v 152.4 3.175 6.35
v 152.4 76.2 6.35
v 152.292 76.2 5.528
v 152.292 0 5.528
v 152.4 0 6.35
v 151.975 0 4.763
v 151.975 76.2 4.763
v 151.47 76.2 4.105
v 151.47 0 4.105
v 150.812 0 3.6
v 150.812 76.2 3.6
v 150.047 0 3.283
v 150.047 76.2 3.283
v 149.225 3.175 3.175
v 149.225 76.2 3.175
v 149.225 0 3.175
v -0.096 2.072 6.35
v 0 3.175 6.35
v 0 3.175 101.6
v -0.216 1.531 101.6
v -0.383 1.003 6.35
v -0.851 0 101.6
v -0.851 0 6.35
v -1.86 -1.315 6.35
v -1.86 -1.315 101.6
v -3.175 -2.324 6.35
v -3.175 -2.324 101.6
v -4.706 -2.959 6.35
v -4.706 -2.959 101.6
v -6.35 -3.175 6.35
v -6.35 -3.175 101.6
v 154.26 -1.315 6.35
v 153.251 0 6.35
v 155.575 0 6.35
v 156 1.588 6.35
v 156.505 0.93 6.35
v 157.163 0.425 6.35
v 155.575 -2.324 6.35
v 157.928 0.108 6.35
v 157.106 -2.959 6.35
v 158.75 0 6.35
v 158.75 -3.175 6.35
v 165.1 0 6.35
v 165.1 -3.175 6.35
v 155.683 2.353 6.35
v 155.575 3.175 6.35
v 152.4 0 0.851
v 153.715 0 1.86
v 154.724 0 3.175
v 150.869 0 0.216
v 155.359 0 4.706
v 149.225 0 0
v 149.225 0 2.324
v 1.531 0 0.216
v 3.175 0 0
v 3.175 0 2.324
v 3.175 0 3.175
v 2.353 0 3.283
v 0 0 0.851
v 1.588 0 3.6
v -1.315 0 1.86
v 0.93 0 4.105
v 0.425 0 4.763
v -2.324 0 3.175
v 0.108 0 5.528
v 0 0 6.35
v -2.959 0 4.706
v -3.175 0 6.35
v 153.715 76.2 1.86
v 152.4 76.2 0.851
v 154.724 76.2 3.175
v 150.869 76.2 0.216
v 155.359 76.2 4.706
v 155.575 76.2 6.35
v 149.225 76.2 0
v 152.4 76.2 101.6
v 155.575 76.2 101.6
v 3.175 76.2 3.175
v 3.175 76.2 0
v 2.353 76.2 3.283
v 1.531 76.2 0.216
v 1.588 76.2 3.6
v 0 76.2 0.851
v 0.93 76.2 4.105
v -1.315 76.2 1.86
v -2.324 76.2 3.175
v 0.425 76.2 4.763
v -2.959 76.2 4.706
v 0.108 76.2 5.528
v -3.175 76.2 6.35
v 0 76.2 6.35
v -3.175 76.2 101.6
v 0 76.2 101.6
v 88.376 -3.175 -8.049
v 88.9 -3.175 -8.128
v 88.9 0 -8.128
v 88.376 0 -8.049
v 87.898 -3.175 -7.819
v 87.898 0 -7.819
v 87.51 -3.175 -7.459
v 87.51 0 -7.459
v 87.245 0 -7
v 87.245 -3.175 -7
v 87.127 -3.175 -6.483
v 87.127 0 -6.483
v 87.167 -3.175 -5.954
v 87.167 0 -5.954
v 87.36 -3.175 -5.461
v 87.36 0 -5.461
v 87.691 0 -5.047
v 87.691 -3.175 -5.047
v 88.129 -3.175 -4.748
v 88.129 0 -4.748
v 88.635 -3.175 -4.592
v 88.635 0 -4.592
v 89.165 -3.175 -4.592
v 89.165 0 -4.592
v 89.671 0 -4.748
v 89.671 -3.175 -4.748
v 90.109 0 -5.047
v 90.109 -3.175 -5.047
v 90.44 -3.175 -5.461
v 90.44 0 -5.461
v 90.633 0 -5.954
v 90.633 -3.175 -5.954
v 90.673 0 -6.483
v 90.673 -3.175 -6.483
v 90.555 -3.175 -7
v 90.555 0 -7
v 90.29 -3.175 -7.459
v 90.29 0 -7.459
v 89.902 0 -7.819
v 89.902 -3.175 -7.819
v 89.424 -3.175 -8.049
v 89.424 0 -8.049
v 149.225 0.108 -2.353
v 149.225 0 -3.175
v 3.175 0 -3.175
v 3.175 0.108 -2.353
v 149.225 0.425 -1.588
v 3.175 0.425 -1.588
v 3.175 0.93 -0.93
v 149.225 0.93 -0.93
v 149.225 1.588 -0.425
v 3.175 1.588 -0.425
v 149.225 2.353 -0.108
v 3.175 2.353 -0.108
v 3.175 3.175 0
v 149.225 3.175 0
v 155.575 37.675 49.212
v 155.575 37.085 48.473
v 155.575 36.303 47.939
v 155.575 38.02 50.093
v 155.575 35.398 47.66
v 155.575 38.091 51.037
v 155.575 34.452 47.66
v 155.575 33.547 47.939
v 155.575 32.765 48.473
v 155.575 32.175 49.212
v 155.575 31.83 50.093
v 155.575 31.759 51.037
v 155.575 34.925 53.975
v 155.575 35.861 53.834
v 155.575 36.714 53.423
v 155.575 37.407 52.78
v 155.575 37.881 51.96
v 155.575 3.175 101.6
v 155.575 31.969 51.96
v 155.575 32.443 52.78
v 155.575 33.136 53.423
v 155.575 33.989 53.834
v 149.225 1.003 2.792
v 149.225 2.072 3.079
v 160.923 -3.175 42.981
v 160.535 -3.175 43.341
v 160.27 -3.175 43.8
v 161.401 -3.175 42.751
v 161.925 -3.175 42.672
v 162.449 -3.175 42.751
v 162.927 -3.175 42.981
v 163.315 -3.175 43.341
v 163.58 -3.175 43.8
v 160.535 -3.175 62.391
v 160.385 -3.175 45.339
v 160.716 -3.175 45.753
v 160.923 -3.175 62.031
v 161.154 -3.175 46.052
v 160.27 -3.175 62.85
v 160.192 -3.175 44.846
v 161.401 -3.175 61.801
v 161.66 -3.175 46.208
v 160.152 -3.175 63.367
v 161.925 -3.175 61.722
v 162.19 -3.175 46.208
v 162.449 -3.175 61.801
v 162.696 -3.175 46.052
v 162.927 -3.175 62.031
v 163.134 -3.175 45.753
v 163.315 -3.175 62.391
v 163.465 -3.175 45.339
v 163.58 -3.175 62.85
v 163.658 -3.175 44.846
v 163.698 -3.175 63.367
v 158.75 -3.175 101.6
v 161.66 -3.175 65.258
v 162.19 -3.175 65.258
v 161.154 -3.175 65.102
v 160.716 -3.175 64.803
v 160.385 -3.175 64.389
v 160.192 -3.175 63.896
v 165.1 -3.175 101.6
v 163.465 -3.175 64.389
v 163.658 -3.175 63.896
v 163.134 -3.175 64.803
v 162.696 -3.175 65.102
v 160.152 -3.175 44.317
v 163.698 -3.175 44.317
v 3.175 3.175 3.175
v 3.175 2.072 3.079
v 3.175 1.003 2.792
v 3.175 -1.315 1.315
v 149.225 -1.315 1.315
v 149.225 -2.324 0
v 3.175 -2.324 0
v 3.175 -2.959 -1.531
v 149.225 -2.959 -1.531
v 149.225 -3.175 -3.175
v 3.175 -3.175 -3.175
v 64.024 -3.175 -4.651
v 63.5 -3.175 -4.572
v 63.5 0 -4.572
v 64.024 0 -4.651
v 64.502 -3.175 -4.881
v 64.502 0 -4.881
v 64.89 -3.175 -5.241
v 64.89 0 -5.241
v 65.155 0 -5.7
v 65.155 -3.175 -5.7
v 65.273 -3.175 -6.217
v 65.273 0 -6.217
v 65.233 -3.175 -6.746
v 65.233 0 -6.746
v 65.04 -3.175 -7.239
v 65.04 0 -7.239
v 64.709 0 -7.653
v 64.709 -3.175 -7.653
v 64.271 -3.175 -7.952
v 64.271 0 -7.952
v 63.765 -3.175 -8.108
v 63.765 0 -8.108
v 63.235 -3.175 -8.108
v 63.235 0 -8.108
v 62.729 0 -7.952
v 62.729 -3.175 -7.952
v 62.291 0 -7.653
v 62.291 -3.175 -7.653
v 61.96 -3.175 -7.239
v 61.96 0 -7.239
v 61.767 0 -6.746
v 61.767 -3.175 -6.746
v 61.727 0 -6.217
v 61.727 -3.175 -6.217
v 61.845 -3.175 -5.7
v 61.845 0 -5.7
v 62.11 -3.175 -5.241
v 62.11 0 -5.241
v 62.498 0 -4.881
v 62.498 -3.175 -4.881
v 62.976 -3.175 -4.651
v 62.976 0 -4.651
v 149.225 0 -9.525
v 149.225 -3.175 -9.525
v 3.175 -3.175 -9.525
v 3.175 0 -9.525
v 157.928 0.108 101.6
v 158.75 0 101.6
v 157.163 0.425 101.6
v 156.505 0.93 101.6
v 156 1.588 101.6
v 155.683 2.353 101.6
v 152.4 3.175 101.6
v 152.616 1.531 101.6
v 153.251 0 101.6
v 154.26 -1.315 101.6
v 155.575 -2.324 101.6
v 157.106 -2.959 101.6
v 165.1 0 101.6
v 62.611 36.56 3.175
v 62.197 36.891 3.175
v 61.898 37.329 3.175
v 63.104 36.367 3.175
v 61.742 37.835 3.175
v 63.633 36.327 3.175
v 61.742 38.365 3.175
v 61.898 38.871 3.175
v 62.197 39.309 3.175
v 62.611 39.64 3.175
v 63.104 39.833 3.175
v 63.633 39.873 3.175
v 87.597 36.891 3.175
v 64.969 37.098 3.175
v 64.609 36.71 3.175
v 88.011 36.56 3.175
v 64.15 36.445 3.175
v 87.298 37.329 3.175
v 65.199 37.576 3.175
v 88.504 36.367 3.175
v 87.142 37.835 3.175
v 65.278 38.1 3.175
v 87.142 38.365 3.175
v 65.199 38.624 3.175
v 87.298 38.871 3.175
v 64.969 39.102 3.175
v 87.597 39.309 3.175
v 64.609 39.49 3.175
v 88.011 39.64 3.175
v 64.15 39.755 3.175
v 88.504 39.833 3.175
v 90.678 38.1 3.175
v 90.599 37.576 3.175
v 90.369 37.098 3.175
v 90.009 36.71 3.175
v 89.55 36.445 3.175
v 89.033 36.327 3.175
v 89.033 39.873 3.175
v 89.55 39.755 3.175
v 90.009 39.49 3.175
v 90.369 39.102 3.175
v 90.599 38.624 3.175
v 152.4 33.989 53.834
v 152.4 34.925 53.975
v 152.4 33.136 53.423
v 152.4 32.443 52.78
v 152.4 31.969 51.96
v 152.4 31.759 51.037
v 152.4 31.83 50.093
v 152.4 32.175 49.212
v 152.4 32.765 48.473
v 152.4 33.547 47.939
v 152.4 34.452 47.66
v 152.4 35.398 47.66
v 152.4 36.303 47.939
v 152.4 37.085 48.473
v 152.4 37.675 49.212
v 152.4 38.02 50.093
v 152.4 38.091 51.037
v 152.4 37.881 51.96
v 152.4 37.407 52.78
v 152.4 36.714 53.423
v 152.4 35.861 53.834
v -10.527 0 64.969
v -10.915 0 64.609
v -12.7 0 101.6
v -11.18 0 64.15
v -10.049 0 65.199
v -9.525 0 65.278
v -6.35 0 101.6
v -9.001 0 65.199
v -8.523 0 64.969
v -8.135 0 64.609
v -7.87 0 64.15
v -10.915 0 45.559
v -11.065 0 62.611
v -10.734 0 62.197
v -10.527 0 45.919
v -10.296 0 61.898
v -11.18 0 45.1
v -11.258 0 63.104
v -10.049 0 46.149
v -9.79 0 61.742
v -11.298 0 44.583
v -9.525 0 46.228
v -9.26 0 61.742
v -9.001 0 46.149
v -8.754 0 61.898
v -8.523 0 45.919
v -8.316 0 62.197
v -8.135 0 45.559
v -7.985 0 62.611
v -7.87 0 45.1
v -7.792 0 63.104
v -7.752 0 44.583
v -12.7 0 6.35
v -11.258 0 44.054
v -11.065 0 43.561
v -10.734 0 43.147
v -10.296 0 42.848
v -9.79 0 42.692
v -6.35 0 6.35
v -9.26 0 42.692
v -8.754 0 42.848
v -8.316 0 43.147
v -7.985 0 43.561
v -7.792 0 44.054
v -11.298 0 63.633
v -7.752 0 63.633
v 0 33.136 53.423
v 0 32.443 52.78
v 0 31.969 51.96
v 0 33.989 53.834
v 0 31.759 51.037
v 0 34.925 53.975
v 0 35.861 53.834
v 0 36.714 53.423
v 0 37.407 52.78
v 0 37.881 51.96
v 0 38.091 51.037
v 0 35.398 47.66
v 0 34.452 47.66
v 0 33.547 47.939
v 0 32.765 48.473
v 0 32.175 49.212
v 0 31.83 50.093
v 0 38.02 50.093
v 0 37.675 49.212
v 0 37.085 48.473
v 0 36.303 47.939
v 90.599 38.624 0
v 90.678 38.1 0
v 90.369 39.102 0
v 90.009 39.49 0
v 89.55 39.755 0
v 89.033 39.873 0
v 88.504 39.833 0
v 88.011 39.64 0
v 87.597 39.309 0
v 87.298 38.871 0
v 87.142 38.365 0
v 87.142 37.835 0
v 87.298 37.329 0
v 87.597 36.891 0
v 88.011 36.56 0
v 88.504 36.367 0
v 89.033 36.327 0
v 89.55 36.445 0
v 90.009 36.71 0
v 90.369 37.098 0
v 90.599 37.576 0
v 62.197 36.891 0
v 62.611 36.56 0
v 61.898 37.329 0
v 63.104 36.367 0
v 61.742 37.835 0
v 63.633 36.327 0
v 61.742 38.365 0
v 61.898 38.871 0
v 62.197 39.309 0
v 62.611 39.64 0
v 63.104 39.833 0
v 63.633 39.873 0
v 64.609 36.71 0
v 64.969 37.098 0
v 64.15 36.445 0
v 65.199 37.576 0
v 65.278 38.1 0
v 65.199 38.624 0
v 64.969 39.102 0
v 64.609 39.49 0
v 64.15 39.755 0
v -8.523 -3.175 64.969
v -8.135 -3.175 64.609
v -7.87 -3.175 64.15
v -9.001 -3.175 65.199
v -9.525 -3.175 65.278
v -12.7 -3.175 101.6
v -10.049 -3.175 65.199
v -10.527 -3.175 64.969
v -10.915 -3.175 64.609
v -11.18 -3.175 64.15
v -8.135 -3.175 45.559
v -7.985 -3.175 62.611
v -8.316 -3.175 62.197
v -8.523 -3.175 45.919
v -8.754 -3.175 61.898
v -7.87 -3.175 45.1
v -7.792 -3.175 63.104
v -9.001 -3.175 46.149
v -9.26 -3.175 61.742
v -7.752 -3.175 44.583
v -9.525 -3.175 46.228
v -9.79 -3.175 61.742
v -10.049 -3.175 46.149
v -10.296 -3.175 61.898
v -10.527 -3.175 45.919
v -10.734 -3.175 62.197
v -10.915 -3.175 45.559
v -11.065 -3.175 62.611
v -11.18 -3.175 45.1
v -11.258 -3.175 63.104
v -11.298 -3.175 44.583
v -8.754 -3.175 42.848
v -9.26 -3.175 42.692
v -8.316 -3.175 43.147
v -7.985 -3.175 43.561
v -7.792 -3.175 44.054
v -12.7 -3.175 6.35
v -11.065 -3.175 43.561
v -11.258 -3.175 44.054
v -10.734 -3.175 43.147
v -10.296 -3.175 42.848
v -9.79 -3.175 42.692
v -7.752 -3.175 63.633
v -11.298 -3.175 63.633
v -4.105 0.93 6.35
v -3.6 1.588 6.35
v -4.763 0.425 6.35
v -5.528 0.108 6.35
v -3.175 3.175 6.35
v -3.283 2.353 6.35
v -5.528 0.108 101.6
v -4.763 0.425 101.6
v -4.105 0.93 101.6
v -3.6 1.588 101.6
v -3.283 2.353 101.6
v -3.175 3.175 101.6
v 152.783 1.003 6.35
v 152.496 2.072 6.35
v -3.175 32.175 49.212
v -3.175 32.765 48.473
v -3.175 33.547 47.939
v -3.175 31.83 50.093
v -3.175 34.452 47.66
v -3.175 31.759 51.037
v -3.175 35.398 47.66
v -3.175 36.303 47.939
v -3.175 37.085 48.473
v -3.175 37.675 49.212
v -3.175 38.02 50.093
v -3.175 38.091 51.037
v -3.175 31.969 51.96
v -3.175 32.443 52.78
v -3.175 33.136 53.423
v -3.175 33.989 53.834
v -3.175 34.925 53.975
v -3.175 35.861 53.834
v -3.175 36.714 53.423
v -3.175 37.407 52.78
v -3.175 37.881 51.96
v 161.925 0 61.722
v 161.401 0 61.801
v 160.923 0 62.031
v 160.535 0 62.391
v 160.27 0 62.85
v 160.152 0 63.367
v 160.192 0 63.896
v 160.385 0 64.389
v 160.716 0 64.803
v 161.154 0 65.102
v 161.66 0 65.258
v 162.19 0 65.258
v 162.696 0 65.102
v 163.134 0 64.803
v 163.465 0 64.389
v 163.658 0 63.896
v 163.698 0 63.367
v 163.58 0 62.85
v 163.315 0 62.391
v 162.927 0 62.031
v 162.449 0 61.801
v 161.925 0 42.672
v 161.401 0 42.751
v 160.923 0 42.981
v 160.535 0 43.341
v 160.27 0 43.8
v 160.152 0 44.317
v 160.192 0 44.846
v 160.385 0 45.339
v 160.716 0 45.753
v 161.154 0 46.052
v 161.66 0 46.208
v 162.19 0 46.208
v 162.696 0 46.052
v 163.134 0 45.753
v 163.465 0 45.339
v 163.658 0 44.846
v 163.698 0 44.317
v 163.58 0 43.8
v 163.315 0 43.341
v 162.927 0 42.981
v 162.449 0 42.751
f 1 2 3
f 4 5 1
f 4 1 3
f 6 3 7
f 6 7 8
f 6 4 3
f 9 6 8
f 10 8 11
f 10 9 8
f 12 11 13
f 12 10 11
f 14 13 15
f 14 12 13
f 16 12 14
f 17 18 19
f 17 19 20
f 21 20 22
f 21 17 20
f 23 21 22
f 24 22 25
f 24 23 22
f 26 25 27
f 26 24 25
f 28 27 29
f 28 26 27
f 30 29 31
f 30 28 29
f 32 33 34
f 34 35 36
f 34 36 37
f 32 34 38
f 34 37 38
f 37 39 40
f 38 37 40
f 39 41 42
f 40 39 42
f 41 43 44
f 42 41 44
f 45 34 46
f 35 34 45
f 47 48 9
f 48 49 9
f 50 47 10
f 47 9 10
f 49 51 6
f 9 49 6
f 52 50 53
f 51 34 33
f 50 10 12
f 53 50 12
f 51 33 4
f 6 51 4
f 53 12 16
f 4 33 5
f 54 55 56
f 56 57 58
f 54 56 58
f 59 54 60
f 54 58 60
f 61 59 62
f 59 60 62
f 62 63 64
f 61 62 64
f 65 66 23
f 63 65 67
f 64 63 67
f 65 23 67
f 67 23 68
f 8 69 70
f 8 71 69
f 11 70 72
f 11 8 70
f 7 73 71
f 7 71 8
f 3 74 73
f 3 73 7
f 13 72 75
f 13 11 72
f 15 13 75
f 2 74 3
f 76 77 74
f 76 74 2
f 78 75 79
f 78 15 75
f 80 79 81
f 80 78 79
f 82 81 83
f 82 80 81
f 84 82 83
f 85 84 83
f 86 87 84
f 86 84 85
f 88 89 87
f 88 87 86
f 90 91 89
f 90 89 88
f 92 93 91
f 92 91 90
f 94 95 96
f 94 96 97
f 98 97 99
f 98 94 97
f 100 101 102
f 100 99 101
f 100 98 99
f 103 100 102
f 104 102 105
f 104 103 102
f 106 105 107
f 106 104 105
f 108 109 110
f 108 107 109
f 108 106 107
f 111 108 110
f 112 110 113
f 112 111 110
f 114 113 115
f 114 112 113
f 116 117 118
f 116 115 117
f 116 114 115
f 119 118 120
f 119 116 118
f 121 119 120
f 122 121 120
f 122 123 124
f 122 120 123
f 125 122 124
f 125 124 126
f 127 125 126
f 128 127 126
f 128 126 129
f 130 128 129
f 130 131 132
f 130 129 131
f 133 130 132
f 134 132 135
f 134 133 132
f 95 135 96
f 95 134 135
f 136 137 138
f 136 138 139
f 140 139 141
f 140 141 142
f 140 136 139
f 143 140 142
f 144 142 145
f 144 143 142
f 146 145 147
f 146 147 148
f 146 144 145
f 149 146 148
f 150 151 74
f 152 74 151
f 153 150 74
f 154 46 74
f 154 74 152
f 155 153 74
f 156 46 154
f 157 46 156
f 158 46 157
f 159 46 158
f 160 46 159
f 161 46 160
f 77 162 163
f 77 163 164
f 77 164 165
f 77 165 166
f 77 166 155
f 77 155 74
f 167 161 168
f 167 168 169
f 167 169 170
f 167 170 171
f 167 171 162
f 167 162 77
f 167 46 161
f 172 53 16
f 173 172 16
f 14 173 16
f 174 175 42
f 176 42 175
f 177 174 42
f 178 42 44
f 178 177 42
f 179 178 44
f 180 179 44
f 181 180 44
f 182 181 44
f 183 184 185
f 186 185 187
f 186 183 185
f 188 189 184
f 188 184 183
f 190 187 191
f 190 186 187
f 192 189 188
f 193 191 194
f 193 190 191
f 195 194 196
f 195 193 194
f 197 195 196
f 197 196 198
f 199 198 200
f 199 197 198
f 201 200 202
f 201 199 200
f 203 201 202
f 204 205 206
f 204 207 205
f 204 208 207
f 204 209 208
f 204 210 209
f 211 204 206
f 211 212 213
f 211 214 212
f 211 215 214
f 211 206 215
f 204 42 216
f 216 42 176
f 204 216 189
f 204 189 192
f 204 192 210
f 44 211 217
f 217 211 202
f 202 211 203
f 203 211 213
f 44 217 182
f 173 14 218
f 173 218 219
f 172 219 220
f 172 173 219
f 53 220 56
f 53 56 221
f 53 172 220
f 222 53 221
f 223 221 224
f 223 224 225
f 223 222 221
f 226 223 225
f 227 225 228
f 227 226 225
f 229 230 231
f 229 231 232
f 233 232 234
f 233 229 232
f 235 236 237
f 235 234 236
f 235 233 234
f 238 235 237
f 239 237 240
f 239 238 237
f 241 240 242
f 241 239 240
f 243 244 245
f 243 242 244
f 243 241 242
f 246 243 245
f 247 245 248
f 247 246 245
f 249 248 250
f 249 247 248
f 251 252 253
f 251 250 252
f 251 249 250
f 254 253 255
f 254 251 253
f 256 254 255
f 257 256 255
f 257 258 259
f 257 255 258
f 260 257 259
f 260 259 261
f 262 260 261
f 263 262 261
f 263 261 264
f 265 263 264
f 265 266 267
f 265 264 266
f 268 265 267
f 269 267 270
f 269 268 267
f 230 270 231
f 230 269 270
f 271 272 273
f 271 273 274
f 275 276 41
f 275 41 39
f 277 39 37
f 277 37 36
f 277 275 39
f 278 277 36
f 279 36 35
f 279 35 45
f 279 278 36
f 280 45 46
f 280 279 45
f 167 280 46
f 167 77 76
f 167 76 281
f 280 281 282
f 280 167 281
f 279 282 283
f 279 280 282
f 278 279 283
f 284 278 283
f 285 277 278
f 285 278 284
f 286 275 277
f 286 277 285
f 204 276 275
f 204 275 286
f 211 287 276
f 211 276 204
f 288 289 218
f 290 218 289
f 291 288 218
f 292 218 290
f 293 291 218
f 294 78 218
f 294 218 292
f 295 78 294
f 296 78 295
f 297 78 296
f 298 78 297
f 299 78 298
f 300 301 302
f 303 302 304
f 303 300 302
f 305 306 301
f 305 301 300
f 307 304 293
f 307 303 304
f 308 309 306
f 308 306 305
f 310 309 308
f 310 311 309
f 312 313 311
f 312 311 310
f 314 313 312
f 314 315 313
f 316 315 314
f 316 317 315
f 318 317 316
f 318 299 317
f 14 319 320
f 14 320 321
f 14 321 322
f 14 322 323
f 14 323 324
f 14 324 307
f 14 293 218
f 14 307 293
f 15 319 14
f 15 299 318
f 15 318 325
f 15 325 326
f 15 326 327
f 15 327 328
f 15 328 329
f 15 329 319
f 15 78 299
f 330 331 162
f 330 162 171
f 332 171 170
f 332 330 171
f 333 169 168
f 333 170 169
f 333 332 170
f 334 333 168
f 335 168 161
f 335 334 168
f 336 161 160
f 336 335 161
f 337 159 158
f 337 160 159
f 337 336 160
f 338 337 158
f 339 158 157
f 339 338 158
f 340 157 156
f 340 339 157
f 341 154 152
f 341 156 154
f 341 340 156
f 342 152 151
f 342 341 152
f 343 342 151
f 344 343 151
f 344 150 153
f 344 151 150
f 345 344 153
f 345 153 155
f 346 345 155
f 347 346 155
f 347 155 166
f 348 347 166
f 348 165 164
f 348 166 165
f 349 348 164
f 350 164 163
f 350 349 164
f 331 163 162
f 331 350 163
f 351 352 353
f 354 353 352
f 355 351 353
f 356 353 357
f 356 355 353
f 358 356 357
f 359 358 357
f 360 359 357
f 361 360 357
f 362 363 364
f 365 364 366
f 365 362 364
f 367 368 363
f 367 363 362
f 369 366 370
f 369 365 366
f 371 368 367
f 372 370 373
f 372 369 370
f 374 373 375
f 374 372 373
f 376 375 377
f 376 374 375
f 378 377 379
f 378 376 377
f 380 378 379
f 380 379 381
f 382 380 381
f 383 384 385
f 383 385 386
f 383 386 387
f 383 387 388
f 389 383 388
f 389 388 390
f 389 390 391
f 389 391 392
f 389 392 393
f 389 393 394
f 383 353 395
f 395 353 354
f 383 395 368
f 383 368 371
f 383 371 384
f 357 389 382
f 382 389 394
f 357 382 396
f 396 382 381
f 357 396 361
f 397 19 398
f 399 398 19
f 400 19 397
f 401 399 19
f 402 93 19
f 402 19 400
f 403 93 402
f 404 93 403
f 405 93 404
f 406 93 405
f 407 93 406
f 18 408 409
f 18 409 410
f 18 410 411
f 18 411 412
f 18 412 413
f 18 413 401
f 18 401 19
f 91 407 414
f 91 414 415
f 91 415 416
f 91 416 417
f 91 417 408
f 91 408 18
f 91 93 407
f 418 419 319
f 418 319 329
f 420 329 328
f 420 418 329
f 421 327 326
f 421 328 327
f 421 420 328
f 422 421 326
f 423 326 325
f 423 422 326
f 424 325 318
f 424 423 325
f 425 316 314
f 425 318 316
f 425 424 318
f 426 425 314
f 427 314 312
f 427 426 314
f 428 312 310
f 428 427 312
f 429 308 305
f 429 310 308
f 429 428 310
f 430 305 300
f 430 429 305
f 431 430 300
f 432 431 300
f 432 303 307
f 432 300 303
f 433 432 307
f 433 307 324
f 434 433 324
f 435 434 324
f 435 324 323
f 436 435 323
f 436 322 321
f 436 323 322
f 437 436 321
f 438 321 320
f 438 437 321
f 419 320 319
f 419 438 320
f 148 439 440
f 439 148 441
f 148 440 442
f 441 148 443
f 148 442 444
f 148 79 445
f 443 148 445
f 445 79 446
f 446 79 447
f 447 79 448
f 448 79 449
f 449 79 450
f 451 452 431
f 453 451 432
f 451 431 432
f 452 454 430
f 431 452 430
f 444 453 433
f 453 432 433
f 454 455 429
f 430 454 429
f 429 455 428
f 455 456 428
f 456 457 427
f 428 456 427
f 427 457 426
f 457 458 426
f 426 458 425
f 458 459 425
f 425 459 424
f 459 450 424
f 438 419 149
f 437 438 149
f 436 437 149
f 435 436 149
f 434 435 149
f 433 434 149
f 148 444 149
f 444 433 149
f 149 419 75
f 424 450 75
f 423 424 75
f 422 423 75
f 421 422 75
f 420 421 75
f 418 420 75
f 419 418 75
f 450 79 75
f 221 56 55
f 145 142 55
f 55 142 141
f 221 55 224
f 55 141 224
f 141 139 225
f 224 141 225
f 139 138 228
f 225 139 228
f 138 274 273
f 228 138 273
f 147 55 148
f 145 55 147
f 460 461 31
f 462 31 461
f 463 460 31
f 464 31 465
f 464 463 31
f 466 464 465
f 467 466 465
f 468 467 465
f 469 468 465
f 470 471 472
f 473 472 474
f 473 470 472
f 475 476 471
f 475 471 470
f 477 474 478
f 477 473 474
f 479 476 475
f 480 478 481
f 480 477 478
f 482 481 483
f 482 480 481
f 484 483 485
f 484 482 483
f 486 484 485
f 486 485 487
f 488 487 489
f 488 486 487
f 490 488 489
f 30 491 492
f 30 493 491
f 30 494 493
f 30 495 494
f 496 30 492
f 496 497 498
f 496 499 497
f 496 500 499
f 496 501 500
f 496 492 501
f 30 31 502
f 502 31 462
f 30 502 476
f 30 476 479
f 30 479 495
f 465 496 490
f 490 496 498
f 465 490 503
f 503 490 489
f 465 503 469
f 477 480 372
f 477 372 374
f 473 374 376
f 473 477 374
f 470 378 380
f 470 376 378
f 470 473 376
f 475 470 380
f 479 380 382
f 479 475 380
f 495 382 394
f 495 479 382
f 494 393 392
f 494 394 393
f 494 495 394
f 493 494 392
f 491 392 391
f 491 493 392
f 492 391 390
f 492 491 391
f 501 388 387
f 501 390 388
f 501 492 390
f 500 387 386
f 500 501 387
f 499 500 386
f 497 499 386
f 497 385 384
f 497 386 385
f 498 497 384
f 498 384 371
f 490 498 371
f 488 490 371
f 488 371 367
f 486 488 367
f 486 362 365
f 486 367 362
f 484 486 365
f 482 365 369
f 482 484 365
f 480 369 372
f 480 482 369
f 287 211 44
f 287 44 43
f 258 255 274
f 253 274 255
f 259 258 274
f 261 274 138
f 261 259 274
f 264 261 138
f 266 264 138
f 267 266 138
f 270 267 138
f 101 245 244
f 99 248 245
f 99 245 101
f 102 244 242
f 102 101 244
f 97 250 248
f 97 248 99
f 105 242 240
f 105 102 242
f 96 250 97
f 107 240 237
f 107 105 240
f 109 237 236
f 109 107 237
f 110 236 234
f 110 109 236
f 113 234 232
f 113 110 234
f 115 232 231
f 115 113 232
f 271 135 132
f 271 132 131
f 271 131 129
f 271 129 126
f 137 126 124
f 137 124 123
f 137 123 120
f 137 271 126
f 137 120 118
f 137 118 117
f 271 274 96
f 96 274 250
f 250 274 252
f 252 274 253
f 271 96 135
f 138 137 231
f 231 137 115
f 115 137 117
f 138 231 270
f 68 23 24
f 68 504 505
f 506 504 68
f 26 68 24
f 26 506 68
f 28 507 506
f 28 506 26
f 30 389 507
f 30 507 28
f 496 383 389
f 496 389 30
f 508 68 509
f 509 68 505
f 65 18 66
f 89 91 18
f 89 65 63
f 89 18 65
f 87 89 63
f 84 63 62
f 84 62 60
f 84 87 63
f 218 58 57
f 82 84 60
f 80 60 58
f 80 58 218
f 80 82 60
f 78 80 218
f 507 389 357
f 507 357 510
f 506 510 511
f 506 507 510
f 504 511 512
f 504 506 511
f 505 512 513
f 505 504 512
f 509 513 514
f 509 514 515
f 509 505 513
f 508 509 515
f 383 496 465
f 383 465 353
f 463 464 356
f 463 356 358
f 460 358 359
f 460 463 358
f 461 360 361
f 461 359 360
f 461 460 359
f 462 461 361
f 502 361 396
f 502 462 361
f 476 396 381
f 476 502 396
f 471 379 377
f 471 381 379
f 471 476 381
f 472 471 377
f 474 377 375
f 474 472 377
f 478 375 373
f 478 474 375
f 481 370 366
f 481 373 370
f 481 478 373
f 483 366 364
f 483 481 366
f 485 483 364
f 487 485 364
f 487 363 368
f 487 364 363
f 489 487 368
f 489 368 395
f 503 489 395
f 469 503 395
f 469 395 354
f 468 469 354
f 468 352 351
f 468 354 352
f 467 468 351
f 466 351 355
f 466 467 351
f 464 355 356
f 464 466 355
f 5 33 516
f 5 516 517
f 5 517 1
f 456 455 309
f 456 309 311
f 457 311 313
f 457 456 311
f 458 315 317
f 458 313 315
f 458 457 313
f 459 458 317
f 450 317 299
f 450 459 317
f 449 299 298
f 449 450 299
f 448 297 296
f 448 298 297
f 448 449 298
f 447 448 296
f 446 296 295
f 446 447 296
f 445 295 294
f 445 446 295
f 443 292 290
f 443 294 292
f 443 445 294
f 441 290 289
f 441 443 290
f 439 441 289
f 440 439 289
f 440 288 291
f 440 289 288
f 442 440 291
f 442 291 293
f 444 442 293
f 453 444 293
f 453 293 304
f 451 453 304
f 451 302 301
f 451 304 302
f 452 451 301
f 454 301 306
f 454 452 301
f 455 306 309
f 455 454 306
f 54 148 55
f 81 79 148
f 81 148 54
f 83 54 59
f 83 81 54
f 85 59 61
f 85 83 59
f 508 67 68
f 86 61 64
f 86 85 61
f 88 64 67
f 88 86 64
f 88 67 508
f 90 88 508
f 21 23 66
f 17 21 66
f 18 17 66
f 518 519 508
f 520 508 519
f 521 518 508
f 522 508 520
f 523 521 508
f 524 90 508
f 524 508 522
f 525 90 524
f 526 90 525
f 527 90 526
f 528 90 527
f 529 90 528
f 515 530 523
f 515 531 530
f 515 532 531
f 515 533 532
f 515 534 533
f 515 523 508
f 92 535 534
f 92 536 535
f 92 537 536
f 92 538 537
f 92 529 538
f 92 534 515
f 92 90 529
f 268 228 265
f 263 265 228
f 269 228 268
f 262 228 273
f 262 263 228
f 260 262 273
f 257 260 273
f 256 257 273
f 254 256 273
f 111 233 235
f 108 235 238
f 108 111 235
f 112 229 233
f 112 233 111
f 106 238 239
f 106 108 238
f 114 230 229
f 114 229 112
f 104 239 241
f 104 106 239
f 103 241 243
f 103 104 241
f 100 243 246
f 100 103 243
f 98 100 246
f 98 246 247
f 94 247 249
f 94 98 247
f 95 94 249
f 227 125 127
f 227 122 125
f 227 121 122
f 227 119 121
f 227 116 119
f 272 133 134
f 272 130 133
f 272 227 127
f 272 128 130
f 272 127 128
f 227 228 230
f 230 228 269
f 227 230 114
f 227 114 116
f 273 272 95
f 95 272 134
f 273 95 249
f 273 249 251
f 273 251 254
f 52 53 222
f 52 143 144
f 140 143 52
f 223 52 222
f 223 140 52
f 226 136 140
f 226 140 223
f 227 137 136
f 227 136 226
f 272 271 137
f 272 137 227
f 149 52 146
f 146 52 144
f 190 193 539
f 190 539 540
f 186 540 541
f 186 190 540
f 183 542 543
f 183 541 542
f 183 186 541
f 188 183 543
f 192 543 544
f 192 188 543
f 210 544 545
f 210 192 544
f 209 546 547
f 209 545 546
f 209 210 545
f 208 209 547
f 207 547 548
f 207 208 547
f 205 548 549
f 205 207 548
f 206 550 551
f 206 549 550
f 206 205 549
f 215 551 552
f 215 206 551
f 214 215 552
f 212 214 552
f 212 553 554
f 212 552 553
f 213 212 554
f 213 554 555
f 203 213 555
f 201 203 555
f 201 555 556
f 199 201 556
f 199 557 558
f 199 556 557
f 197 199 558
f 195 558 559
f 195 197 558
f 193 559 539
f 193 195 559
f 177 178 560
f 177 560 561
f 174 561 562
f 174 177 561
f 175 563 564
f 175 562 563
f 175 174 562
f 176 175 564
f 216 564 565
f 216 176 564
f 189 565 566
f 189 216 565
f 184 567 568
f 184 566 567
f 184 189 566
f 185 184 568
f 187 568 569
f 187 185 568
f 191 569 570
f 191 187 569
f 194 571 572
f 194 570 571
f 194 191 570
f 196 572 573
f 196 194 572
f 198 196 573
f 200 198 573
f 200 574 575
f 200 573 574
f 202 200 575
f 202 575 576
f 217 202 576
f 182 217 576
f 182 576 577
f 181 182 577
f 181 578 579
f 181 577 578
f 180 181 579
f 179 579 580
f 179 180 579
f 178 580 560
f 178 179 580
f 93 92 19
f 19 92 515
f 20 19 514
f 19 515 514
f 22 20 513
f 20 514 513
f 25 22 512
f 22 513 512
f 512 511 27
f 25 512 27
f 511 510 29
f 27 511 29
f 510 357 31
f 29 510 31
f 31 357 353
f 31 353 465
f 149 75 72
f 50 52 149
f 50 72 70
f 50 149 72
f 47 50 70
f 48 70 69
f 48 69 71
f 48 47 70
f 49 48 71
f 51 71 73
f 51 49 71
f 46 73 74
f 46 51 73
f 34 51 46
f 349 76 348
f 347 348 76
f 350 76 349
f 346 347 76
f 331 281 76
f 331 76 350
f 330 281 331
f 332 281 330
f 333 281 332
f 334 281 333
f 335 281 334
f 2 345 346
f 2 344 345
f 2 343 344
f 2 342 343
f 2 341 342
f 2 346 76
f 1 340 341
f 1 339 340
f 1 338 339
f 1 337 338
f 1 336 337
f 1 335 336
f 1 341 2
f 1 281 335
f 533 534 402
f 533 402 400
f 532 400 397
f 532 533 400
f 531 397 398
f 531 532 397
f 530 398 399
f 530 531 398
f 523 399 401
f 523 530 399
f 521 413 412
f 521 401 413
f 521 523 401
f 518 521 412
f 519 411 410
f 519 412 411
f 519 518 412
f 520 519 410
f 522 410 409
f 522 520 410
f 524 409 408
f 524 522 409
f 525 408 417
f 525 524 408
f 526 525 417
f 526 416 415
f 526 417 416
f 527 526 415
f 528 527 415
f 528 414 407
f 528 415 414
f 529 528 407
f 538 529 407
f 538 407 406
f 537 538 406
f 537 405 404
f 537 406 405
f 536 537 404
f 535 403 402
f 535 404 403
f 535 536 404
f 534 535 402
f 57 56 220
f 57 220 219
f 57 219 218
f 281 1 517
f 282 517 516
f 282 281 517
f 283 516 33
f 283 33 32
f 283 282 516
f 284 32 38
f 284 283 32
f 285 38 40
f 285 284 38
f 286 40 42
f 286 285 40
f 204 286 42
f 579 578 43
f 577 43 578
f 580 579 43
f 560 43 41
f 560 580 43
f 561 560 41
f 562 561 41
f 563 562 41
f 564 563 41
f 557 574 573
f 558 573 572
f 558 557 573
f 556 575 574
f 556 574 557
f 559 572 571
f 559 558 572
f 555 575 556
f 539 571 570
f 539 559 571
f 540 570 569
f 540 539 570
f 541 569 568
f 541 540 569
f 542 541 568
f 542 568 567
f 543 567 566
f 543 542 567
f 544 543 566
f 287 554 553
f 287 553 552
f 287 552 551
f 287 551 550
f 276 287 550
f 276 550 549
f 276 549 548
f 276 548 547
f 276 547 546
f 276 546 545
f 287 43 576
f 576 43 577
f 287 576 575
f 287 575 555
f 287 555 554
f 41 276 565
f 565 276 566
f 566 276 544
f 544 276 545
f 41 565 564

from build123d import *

# Parameters (mm, degrees)
SKETCH1_W                    = 152.4
SKETCH1_H                    = 76.2
BOSS_EXTRUDE1_DEPTH          = 3.175
EDGE_FLANGE5_STRIP_W         = 19.05
EDGE_FLANGE5_STRIP_H         = 3.175
EDGE_FLANGE5_STRIP_CUT_DEPTH = 76.2
EDGE_FLANGE5_DEPTH           = 76.2
EDGE_FLANGE6_STRIP_W         = 19.05
EDGE_FLANGE6_STRIP_H         = 3.175
EDGE_FLANGE6_STRIP_CUT_DEPTH = 76.2
EDGE_FLANGE6_DEPTH           = 76.2
EDGE_FLANGE7_STRIP_W         = 19.05
EDGE_FLANGE7_STRIP_H         = 3.175
EDGE_FLANGE7_STRIP_CUT_DEPTH = 146.05
EDGE_FLANGE7_DEPTH           = 146.05
EDGE_FLANGE8_STRIP_W         = 19.05
EDGE_FLANGE8_STRIP_H         = 3.175
EDGE_FLANGE8_STRIP_CUT_DEPTH = 95.25
EDGE_FLANGE8_DEPTH           = 95.25
EDGE_FLANGE9_STRIP_W         = 19.05
EDGE_FLANGE9_STRIP_H         = 3.175
EDGE_FLANGE9_STRIP_CUT_DEPTH = 95.25
EDGE_FLANGE9_DEPTH           = 95.25
CUT_EXTRUDE1_DEPTH           = 211.820956323
CUT_EXTRUDE1_DEPTH_BACK      = 211.820956323
SKETCH60_R                   = 3.175
CUT_EXTRUDE2_DEPTH           = 207.765399971
CUT_EXTRUDE2_DEPTH_BACK      = 207.765399971
SKETCH61_R                   = 1.778
CUT_EXTRUDE3_DEPTH           = 209.295487229
CUT_EXTRUDE3_DEPTH_BACK      = 209.295487229
SKETCH62_R                   = 1.778


# Sheet-metal steps are written as plain solids
with BuildPart() as part:
    # Sketch1 → Boss-Extrude1 (new body)
    with BuildSketch(Plane.XY):
        with Locations((76.2, 38.1)):
            Rectangle(SKETCH1_W, SKETCH1_H)
    extrude(amount=BOSS_EXTRUDE1_DEPTH)

    # Edge-Flange5 strip (across the edge) → Edge-Flange5 strip cut (cut)
    with BuildSketch(Plane(origin=(152.4, 0, 3.175), x_dir=(-1, 0, 0), z_dir=(0, 1, 0))):
        with Locations((-6.35, -1.5875)):
            Rectangle(EDGE_FLANGE5_STRIP_W, EDGE_FLANGE5_STRIP_H)
    extrude(amount=EDGE_FLANGE5_STRIP_CUT_DEPTH, mode=Mode.SUBTRACT)

    # Edge-Flange5 section (across the edge) → Edge-Flange5 (add)
    with BuildSketch(Plane(origin=(152.4, 0, 3.175), x_dir=(-1, 0, 0), z_dir=(0, 1, 0))):
        with BuildLine():
            Line((-3.175, 3.175), (-3.175, 98.425))
            Line((-3.175, 98.425), (0, 98.425))
            Line((0, 98.425), (0, 3.175))
            ThreePointArc((0, 3.175), (0.92993597, 0.92993597), (3.175, 0))
            Line((3.175, 0), (3.175, -3.175))
            ThreePointArc((3.175, -3.175), (-1.315128061, -1.315128061), (-3.175, 3.175))
        make_face()
    extrude(amount=EDGE_FLANGE5_DEPTH)

    # Edge-Flange6 strip (across the edge) → Edge-Flange6 strip cut (cut)
    with BuildSketch(Plane(origin=(0, 76.2, 3.175), x_dir=(1, 0, 0), z_dir=(0, -1, 0))):
        with Locations((-6.35, -1.5875)):
            Rectangle(EDGE_FLANGE6_STRIP_W, EDGE_FLANGE6_STRIP_H)
    extrude(amount=EDGE_FLANGE6_STRIP_CUT_DEPTH, mode=Mode.SUBTRACT)

    # Edge-Flange6 section (across the edge) → Edge-Flange6 (add)
    with BuildSketch(Plane(origin=(0, 76.2, 3.175), x_dir=(1, 0, 0), z_dir=(0, -1, 0))):
        with BuildLine():
            Line((-3.175, 3.175), (-3.175, 98.425))
            Line((-3.175, 98.425), (0, 98.425))
            Line((0, 98.425), (0, 3.175))
            ThreePointArc((0, 3.175), (0.92993597, 0.92993597), (3.175, 0))
            Line((3.175, 0), (3.175, -3.175))
            ThreePointArc((3.175, -3.175), (-1.315128061, -1.315128061), (-3.175, 3.175))
        make_face()
    extrude(amount=EDGE_FLANGE6_DEPTH)

    # Edge-Flange7 strip (across the edge) → Edge-Flange7 strip cut (cut)
    with BuildSketch(Plane(origin=(149.225, 0, 0), x_dir=(0, 1, 0), z_dir=(-1, 0, 0))):
        with Locations((-6.35, -1.5875)):
            Rectangle(EDGE_FLANGE7_STRIP_W, EDGE_FLANGE7_STRIP_H)
    extrude(amount=EDGE_FLANGE7_STRIP_CUT_DEPTH, mode=Mode.SUBTRACT)

    # Edge-Flange7 section (across the edge) → Edge-Flange7 (add)
    with BuildSketch(Plane(origin=(149.225, 0, 0), x_dir=(0, 1, 0), z_dir=(-1, 0, 0))):
        with BuildLine():
            Line((-3.175, 3.175), (-3.175, 9.525))
            Line((-3.175, 9.525), (0, 9.525))
            Line((0, 9.525), (0, 3.175))
            ThreePointArc((0, 3.175), (0.92993597, 0.92993597), (3.175, 0))
            Line((3.175, 0), (3.175, -3.175))
            ThreePointArc((3.175, -3.175), (-1.315128061, -1.315128061), (-3.175, 3.175))
        make_face()
    extrude(amount=EDGE_FLANGE7_DEPTH)

    # Edge-Flange8 strip (across the edge) → Edge-Flange8 strip cut (cut)
    with BuildSketch(Plane(origin=(155.575, 0, 101.6), x_dir=(0, 1, 0), z_dir=(0, 0, -1))):
        with Locations((-6.35, -1.5875)):
            Rectangle(EDGE_FLANGE8_STRIP_W, EDGE_FLANGE8_STRIP_H)
    extrude(amount=EDGE_FLANGE8_STRIP_CUT_DEPTH, mode=Mode.SUBTRACT)

    # Edge-Flange8 section (across the edge) → Edge-Flange8 (add)
    with BuildSketch(Plane(origin=(155.575, 0, 101.6), x_dir=(0, 1, 0), z_dir=(0, 0, -1))):
        with BuildLine():
            Line((-3.175, 3.175), (-3.175, 9.525))
            Line((-3.175, 9.525), (0, 9.525))
            Line((0, 9.525), (0, 3.175))
            ThreePointArc((0, 3.175), (0.92993597, 0.92993597), (3.175, 0))
            Line((3.175, 0), (3.175, -3.175))
            ThreePointArc((3.175, -3.175), (-1.315128061, -1.315128061), (-3.175, 3.175))
        make_face()
    extrude(amount=EDGE_FLANGE8_DEPTH)

    # Edge-Flange9 strip (across the edge) → Edge-Flange9 strip cut (cut)
    with BuildSketch(Plane(origin=(-3.175, 0, 6.35), x_dir=(0, 1, 0), z_dir=(0, 0, 1))):
        with Locations((-6.35, -1.5875)):
            Rectangle(EDGE_FLANGE9_STRIP_W, EDGE_FLANGE9_STRIP_H)
    extrude(amount=EDGE_FLANGE9_STRIP_CUT_DEPTH, mode=Mode.SUBTRACT)

    # Edge-Flange9 section (across the edge) → Edge-Flange9 (add)
    with BuildSketch(Plane(origin=(-3.175, 0, 6.35), x_dir=(0, 1, 0), z_dir=(0, 0, 1))):
        with BuildLine():
            Line((-3.175, 3.175), (-3.175, 9.525))
            Line((-3.175, 9.525), (0, 9.525))
            Line((0, 9.525), (0, 3.175))
            ThreePointArc((0, 3.175), (0.92993597, 0.92993597), (3.175, 0))
            Line((3.175, 0), (3.175, -3.175))
            ThreePointArc((3.175, -3.175), (-1.315128061, -1.315128061), (-3.175, 3.175))
        make_face()
    extrude(amount=EDGE_FLANGE9_DEPTH)

    # Sketch60 → Cut-Extrude1 (cut, two sides: drawn at the far end of the back side and taken through both)
    with BuildSketch(Plane(origin=(155.575, 0, 0), x_dir=(0, 0, -1), z_dir=(1, 0, 0)).offset(-CUT_EXTRUDE1_DEPTH_BACK)):
        with Locations(Location((-50.8, 34.925, 0), (0, 0, 180))):
            Circle(SKETCH60_R)
    extrude(amount=CUT_EXTRUDE1_DEPTH + CUT_EXTRUDE1_DEPTH_BACK, mode=Mode.SUBTRACT)

    # Sketch61 → Cut-Extrude2 (cut, two sides: drawn at the far end of the back side and taken through both)
    with BuildSketch(Plane.XY.offset(3.175).offset(-CUT_EXTRUDE2_DEPTH_BACK)):
        with Locations((88.9, 38.1)):
            Circle(SKETCH61_R)
        with Locations((63.5, 38.1)):
            Circle(SKETCH61_R)
    extrude(amount=CUT_EXTRUDE2_DEPTH + CUT_EXTRUDE2_DEPTH_BACK, mode=Mode.SUBTRACT)

    # Sketch62 → Cut-Extrude3 (cut, two sides: drawn at the far end of the back side and taken through both)
    with BuildSketch(Plane(origin=(0, 0, 0), x_dir=(1, 0, 0), z_dir=(0, 1, 0)).offset(-CUT_EXTRUDE3_DEPTH_BACK)):
        with Locations(Location((63.5, 6.35, 0), (0, 0, 270))):
            Circle(SKETCH62_R)
        with Locations(Location((-9.525, -44.45, 0), (0, 0, 270))):
            Circle(SKETCH62_R)
        with Locations(Location((-9.525, -63.5, 0), (0, 0, 270))):
            Circle(SKETCH62_R)
        with Locations(Location((161.925, -63.5, 0), (0, 0, 90))):
            Circle(SKETCH62_R)
        with Locations(Location((161.925, -44.45, 0), (0, 0, 90))):
            Circle(SKETCH62_R)
        with Locations(Location((88.9, 6.35, 0), (0, 0, 90))):
            Circle(SKETCH62_R)
    extrude(amount=CUT_EXTRUDE3_DEPTH + CUT_EXTRUDE3_DEPTH_BACK, mode=Mode.SUBTRACT)


solid = part.part
